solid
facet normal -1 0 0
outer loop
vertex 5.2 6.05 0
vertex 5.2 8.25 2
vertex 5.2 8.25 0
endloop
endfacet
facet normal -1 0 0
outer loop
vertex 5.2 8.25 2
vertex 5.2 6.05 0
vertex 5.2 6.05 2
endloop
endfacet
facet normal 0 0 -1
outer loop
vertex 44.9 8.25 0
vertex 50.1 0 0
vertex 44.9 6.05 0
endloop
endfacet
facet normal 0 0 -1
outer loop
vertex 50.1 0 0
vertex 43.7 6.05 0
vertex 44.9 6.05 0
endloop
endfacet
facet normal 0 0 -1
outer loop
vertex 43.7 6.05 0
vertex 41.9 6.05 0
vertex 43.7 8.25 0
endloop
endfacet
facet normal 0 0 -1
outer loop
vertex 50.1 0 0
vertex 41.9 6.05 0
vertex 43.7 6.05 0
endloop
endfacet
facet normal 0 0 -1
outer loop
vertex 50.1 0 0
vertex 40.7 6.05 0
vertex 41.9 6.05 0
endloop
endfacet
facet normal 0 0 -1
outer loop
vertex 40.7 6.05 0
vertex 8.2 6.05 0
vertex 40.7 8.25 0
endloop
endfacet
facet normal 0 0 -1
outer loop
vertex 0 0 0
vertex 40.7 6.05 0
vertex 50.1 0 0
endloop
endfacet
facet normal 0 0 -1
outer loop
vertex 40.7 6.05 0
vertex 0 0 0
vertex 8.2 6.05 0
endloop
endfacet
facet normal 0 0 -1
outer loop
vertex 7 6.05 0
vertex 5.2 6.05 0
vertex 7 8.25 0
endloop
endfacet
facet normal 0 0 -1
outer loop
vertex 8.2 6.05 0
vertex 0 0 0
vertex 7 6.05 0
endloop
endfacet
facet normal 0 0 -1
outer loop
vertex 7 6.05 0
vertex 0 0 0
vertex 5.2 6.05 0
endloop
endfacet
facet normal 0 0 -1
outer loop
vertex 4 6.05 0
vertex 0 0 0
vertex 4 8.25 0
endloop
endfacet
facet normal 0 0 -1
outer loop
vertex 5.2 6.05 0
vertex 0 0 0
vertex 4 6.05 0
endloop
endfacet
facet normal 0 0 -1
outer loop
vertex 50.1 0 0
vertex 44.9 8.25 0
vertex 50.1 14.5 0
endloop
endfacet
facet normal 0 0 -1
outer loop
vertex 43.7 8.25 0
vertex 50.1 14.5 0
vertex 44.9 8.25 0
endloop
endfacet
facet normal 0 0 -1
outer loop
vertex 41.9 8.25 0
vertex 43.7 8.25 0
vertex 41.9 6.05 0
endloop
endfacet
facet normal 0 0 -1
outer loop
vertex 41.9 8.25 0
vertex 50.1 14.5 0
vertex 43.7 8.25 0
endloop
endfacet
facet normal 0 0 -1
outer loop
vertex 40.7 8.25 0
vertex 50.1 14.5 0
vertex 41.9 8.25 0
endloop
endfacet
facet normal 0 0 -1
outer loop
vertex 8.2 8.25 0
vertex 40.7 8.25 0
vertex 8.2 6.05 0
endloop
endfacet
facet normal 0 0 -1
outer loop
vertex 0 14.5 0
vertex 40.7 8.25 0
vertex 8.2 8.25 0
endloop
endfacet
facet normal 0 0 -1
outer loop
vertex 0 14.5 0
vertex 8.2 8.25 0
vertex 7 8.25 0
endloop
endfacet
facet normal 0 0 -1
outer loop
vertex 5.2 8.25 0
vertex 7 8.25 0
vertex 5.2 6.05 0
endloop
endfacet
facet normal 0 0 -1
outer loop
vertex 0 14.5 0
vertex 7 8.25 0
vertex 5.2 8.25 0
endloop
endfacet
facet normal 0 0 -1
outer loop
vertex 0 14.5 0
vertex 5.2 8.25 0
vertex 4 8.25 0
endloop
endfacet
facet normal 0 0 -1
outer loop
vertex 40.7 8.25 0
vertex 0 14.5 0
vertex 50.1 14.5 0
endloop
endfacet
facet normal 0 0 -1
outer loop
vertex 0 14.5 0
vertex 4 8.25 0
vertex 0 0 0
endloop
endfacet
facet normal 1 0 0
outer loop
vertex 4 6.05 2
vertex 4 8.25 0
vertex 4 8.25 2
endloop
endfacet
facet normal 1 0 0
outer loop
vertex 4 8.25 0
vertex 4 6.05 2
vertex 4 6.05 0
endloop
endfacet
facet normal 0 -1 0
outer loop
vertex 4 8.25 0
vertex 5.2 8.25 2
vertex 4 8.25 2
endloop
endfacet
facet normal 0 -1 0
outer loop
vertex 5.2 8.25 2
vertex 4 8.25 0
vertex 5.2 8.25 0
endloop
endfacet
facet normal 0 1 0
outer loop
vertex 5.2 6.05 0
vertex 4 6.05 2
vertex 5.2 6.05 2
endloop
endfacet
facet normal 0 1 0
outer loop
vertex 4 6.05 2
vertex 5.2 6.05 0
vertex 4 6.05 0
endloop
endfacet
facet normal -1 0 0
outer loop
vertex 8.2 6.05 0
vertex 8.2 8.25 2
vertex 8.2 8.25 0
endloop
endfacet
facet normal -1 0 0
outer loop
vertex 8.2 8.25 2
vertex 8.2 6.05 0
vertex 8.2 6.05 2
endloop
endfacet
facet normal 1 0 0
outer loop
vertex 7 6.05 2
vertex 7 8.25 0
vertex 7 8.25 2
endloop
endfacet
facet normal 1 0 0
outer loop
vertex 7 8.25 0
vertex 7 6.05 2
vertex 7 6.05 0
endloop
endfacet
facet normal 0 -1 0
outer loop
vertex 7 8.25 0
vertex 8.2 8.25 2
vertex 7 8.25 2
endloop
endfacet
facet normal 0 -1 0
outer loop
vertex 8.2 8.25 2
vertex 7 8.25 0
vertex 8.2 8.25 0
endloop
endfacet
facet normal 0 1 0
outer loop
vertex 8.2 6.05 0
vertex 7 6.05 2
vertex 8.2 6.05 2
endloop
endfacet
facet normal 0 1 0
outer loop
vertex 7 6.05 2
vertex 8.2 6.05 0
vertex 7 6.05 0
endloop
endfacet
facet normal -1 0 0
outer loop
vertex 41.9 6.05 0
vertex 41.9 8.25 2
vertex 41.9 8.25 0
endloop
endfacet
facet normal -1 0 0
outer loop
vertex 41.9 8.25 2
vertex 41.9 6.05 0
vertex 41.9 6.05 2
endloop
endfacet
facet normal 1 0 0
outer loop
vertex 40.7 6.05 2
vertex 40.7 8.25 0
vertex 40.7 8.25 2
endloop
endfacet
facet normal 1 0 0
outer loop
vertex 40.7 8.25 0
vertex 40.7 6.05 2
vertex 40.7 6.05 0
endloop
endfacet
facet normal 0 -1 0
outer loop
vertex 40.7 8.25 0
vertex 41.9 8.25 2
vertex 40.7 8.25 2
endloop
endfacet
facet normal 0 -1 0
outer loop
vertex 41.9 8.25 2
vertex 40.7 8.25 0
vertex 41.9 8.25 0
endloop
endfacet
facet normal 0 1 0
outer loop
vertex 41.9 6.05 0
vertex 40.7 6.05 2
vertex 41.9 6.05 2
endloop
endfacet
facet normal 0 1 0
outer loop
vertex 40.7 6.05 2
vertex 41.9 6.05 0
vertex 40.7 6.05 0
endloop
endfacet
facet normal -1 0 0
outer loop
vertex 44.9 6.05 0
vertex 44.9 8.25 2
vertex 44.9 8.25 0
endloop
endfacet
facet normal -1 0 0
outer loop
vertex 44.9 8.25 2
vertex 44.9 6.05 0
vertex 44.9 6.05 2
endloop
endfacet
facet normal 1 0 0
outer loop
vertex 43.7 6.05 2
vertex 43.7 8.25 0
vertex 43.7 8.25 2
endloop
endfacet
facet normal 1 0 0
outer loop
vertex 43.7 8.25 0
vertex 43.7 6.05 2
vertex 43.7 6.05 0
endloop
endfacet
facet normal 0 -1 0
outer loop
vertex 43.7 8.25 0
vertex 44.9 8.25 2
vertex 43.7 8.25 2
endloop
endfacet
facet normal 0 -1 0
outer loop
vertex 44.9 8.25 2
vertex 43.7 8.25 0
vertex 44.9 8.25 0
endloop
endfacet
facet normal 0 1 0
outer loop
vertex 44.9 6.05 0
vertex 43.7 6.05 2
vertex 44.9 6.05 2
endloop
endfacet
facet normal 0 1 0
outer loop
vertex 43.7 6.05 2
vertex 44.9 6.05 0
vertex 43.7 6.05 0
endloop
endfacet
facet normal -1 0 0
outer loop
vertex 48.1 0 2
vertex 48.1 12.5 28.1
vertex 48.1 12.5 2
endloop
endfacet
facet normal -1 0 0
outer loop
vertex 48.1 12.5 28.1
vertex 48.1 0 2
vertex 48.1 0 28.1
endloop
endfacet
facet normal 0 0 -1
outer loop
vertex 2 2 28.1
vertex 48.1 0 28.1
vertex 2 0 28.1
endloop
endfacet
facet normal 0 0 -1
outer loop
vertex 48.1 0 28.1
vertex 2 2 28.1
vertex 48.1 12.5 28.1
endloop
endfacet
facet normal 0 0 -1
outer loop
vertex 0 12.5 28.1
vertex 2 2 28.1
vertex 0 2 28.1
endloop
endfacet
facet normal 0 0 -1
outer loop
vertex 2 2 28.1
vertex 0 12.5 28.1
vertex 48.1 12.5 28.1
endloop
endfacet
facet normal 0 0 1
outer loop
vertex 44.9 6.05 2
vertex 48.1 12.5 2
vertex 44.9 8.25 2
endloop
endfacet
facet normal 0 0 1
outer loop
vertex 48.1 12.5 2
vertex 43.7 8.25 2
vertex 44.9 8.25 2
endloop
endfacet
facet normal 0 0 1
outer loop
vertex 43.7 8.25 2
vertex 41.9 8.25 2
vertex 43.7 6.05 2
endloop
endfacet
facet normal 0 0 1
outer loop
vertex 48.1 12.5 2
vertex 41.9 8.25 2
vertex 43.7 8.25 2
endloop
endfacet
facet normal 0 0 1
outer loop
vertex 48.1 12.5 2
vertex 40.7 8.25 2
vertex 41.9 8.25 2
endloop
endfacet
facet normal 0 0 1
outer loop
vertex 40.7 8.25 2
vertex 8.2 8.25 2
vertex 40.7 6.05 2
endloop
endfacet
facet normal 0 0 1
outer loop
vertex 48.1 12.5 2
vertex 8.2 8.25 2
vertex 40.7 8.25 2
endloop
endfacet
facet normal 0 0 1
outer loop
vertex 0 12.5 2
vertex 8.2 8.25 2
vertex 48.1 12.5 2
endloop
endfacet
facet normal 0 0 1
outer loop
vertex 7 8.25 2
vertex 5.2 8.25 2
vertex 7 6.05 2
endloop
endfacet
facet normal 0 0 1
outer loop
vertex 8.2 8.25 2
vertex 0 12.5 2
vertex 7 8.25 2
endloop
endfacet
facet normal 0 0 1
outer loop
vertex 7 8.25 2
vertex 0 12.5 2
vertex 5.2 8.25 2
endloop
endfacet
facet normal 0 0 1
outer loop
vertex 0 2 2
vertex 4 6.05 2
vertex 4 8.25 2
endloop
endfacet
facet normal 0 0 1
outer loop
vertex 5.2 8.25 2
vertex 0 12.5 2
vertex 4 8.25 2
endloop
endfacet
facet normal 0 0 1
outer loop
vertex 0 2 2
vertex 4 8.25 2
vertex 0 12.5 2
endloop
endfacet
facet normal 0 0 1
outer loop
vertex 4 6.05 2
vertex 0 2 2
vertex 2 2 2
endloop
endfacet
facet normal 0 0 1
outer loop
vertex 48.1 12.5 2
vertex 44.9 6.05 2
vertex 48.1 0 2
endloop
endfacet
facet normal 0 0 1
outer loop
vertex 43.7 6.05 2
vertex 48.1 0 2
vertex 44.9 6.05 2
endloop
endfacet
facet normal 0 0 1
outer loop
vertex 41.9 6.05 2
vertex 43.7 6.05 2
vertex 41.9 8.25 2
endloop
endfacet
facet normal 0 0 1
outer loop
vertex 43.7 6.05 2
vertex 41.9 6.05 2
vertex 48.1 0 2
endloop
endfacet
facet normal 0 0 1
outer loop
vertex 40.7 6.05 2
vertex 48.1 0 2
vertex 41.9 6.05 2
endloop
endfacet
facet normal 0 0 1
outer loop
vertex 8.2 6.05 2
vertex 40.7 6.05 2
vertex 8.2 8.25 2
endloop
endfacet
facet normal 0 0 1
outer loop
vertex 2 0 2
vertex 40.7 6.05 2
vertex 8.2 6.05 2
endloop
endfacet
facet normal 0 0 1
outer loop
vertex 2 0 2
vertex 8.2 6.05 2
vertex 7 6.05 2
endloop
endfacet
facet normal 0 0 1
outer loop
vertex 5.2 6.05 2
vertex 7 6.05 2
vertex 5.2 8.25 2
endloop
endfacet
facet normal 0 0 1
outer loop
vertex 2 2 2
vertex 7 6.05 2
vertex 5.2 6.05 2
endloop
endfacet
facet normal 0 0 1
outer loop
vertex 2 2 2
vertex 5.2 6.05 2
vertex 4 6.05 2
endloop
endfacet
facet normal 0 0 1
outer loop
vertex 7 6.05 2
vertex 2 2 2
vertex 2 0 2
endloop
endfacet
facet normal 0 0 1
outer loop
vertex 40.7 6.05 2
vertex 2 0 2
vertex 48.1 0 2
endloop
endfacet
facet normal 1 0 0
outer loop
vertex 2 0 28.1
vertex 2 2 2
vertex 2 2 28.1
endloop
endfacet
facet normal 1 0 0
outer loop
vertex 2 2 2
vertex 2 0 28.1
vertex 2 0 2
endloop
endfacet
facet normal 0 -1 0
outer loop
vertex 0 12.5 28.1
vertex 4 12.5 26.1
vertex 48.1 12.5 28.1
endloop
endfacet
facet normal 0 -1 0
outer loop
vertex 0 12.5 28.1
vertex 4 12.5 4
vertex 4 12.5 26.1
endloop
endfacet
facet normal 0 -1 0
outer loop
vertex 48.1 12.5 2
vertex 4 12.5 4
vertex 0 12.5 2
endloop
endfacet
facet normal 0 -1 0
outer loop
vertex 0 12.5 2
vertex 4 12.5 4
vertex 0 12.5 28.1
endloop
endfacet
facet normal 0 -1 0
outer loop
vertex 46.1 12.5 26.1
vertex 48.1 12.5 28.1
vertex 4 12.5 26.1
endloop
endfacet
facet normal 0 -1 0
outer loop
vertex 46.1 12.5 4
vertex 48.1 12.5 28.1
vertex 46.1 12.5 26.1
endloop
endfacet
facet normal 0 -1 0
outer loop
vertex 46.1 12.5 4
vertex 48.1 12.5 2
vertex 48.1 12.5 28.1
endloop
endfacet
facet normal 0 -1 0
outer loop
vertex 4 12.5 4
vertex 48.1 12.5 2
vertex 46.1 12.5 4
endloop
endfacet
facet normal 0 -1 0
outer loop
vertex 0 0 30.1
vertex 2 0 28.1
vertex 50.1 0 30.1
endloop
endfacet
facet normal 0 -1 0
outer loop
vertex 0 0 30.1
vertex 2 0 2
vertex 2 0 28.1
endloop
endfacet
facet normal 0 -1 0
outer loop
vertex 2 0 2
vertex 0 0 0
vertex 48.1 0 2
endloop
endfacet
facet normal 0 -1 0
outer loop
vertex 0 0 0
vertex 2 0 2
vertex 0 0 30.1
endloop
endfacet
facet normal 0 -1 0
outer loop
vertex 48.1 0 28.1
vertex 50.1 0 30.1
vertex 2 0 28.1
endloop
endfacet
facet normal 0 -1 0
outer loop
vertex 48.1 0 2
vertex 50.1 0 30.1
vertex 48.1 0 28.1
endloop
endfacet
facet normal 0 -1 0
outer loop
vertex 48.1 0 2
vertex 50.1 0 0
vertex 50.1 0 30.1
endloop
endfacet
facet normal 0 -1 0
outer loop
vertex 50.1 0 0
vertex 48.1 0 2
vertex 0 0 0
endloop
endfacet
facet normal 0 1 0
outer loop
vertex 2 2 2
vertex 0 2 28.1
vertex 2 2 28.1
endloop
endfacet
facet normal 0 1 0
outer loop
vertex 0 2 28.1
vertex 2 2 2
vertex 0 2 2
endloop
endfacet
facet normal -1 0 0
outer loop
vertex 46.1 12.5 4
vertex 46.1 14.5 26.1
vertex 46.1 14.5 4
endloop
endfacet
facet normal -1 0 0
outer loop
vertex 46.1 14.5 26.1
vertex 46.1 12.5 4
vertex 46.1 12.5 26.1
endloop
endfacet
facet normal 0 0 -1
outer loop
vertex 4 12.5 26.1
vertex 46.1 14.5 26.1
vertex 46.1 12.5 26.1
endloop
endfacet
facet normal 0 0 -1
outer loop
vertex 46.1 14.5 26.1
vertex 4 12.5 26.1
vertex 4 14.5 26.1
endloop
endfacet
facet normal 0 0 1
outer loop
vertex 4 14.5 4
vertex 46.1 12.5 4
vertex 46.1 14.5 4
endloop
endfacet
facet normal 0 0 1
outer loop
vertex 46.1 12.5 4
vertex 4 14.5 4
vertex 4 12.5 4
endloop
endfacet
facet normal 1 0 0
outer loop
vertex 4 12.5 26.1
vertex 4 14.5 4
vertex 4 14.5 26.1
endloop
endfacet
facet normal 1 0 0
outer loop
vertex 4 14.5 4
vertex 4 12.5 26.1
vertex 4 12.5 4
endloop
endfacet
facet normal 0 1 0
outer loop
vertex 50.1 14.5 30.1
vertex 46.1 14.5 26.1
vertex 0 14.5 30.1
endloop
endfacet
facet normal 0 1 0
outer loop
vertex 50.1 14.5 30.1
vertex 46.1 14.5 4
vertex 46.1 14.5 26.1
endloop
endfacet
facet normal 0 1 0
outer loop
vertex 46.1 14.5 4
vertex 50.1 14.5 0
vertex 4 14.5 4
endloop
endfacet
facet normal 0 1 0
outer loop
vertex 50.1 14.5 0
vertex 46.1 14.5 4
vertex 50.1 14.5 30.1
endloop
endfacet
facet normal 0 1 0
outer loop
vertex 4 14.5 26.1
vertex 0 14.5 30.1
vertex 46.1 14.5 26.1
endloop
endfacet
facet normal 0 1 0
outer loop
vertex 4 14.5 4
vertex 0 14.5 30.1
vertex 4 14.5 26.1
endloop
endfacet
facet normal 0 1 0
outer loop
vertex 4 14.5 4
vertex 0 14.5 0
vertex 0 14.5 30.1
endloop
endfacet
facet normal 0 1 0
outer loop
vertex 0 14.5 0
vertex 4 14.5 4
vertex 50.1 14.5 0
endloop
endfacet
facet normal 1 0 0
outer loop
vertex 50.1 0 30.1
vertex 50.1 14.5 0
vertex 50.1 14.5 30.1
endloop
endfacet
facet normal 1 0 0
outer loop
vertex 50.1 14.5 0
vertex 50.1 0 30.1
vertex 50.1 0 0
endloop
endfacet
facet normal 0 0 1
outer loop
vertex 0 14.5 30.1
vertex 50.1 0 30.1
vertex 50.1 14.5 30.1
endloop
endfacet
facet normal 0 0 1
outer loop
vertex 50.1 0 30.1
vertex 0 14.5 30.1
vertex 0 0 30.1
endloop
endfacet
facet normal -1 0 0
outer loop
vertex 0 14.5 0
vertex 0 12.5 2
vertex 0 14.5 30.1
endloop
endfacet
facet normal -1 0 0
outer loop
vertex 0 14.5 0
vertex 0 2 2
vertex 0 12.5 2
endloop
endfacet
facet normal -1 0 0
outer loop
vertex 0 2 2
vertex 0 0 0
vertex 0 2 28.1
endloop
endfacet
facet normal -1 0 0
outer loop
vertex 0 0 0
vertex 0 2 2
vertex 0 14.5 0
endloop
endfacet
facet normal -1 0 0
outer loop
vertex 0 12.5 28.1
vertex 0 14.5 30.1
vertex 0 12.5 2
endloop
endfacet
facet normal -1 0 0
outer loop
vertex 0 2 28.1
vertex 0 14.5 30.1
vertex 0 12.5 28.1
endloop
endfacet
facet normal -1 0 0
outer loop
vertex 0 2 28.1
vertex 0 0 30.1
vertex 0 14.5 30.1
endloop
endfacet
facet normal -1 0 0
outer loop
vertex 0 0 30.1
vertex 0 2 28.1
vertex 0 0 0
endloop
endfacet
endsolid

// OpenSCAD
w=46 + 0.1;
h=26 + 0.1;
depth = 6.5+3+3;
wall = 2;

full_w = w + 2*wall;
full_depth = depth + 2*wall;
full_h = h + 2*wall;

paska_w = 2+0.2;
paska_thick = 1+0.2;
paska_offset=4;
paska_spacing = 3;

module paska() {
  cube([paska_thick, paska_w, 10]);    
  translate([paska_spacing, 0, 0]) cube([paska_thick, paska_w, 10]);    
};

difference() {
  cube([w+2*wall, depth+wall, h+2*wall]);
  union() {
    // back side
    translate([wall, 0, wall]) cube([w, depth, h]);
    
    // wires side
    translate([-wall, wall, wall]) cube([2*wall, depth-wall, h]);
    
    // front side
    translate([2*wall, depth, 2*wall]) cube([w-2*wall, wall, h-2*wall]);
    
    translate([0, full_depth/2-paska_w, 0]) {
      translate([paska_offset, 0, 0]) paska();
      translate([full_w - paska_offset - paska_spacing - 2*paska_thick, 0, 0]) paska();
    }
  }
}
